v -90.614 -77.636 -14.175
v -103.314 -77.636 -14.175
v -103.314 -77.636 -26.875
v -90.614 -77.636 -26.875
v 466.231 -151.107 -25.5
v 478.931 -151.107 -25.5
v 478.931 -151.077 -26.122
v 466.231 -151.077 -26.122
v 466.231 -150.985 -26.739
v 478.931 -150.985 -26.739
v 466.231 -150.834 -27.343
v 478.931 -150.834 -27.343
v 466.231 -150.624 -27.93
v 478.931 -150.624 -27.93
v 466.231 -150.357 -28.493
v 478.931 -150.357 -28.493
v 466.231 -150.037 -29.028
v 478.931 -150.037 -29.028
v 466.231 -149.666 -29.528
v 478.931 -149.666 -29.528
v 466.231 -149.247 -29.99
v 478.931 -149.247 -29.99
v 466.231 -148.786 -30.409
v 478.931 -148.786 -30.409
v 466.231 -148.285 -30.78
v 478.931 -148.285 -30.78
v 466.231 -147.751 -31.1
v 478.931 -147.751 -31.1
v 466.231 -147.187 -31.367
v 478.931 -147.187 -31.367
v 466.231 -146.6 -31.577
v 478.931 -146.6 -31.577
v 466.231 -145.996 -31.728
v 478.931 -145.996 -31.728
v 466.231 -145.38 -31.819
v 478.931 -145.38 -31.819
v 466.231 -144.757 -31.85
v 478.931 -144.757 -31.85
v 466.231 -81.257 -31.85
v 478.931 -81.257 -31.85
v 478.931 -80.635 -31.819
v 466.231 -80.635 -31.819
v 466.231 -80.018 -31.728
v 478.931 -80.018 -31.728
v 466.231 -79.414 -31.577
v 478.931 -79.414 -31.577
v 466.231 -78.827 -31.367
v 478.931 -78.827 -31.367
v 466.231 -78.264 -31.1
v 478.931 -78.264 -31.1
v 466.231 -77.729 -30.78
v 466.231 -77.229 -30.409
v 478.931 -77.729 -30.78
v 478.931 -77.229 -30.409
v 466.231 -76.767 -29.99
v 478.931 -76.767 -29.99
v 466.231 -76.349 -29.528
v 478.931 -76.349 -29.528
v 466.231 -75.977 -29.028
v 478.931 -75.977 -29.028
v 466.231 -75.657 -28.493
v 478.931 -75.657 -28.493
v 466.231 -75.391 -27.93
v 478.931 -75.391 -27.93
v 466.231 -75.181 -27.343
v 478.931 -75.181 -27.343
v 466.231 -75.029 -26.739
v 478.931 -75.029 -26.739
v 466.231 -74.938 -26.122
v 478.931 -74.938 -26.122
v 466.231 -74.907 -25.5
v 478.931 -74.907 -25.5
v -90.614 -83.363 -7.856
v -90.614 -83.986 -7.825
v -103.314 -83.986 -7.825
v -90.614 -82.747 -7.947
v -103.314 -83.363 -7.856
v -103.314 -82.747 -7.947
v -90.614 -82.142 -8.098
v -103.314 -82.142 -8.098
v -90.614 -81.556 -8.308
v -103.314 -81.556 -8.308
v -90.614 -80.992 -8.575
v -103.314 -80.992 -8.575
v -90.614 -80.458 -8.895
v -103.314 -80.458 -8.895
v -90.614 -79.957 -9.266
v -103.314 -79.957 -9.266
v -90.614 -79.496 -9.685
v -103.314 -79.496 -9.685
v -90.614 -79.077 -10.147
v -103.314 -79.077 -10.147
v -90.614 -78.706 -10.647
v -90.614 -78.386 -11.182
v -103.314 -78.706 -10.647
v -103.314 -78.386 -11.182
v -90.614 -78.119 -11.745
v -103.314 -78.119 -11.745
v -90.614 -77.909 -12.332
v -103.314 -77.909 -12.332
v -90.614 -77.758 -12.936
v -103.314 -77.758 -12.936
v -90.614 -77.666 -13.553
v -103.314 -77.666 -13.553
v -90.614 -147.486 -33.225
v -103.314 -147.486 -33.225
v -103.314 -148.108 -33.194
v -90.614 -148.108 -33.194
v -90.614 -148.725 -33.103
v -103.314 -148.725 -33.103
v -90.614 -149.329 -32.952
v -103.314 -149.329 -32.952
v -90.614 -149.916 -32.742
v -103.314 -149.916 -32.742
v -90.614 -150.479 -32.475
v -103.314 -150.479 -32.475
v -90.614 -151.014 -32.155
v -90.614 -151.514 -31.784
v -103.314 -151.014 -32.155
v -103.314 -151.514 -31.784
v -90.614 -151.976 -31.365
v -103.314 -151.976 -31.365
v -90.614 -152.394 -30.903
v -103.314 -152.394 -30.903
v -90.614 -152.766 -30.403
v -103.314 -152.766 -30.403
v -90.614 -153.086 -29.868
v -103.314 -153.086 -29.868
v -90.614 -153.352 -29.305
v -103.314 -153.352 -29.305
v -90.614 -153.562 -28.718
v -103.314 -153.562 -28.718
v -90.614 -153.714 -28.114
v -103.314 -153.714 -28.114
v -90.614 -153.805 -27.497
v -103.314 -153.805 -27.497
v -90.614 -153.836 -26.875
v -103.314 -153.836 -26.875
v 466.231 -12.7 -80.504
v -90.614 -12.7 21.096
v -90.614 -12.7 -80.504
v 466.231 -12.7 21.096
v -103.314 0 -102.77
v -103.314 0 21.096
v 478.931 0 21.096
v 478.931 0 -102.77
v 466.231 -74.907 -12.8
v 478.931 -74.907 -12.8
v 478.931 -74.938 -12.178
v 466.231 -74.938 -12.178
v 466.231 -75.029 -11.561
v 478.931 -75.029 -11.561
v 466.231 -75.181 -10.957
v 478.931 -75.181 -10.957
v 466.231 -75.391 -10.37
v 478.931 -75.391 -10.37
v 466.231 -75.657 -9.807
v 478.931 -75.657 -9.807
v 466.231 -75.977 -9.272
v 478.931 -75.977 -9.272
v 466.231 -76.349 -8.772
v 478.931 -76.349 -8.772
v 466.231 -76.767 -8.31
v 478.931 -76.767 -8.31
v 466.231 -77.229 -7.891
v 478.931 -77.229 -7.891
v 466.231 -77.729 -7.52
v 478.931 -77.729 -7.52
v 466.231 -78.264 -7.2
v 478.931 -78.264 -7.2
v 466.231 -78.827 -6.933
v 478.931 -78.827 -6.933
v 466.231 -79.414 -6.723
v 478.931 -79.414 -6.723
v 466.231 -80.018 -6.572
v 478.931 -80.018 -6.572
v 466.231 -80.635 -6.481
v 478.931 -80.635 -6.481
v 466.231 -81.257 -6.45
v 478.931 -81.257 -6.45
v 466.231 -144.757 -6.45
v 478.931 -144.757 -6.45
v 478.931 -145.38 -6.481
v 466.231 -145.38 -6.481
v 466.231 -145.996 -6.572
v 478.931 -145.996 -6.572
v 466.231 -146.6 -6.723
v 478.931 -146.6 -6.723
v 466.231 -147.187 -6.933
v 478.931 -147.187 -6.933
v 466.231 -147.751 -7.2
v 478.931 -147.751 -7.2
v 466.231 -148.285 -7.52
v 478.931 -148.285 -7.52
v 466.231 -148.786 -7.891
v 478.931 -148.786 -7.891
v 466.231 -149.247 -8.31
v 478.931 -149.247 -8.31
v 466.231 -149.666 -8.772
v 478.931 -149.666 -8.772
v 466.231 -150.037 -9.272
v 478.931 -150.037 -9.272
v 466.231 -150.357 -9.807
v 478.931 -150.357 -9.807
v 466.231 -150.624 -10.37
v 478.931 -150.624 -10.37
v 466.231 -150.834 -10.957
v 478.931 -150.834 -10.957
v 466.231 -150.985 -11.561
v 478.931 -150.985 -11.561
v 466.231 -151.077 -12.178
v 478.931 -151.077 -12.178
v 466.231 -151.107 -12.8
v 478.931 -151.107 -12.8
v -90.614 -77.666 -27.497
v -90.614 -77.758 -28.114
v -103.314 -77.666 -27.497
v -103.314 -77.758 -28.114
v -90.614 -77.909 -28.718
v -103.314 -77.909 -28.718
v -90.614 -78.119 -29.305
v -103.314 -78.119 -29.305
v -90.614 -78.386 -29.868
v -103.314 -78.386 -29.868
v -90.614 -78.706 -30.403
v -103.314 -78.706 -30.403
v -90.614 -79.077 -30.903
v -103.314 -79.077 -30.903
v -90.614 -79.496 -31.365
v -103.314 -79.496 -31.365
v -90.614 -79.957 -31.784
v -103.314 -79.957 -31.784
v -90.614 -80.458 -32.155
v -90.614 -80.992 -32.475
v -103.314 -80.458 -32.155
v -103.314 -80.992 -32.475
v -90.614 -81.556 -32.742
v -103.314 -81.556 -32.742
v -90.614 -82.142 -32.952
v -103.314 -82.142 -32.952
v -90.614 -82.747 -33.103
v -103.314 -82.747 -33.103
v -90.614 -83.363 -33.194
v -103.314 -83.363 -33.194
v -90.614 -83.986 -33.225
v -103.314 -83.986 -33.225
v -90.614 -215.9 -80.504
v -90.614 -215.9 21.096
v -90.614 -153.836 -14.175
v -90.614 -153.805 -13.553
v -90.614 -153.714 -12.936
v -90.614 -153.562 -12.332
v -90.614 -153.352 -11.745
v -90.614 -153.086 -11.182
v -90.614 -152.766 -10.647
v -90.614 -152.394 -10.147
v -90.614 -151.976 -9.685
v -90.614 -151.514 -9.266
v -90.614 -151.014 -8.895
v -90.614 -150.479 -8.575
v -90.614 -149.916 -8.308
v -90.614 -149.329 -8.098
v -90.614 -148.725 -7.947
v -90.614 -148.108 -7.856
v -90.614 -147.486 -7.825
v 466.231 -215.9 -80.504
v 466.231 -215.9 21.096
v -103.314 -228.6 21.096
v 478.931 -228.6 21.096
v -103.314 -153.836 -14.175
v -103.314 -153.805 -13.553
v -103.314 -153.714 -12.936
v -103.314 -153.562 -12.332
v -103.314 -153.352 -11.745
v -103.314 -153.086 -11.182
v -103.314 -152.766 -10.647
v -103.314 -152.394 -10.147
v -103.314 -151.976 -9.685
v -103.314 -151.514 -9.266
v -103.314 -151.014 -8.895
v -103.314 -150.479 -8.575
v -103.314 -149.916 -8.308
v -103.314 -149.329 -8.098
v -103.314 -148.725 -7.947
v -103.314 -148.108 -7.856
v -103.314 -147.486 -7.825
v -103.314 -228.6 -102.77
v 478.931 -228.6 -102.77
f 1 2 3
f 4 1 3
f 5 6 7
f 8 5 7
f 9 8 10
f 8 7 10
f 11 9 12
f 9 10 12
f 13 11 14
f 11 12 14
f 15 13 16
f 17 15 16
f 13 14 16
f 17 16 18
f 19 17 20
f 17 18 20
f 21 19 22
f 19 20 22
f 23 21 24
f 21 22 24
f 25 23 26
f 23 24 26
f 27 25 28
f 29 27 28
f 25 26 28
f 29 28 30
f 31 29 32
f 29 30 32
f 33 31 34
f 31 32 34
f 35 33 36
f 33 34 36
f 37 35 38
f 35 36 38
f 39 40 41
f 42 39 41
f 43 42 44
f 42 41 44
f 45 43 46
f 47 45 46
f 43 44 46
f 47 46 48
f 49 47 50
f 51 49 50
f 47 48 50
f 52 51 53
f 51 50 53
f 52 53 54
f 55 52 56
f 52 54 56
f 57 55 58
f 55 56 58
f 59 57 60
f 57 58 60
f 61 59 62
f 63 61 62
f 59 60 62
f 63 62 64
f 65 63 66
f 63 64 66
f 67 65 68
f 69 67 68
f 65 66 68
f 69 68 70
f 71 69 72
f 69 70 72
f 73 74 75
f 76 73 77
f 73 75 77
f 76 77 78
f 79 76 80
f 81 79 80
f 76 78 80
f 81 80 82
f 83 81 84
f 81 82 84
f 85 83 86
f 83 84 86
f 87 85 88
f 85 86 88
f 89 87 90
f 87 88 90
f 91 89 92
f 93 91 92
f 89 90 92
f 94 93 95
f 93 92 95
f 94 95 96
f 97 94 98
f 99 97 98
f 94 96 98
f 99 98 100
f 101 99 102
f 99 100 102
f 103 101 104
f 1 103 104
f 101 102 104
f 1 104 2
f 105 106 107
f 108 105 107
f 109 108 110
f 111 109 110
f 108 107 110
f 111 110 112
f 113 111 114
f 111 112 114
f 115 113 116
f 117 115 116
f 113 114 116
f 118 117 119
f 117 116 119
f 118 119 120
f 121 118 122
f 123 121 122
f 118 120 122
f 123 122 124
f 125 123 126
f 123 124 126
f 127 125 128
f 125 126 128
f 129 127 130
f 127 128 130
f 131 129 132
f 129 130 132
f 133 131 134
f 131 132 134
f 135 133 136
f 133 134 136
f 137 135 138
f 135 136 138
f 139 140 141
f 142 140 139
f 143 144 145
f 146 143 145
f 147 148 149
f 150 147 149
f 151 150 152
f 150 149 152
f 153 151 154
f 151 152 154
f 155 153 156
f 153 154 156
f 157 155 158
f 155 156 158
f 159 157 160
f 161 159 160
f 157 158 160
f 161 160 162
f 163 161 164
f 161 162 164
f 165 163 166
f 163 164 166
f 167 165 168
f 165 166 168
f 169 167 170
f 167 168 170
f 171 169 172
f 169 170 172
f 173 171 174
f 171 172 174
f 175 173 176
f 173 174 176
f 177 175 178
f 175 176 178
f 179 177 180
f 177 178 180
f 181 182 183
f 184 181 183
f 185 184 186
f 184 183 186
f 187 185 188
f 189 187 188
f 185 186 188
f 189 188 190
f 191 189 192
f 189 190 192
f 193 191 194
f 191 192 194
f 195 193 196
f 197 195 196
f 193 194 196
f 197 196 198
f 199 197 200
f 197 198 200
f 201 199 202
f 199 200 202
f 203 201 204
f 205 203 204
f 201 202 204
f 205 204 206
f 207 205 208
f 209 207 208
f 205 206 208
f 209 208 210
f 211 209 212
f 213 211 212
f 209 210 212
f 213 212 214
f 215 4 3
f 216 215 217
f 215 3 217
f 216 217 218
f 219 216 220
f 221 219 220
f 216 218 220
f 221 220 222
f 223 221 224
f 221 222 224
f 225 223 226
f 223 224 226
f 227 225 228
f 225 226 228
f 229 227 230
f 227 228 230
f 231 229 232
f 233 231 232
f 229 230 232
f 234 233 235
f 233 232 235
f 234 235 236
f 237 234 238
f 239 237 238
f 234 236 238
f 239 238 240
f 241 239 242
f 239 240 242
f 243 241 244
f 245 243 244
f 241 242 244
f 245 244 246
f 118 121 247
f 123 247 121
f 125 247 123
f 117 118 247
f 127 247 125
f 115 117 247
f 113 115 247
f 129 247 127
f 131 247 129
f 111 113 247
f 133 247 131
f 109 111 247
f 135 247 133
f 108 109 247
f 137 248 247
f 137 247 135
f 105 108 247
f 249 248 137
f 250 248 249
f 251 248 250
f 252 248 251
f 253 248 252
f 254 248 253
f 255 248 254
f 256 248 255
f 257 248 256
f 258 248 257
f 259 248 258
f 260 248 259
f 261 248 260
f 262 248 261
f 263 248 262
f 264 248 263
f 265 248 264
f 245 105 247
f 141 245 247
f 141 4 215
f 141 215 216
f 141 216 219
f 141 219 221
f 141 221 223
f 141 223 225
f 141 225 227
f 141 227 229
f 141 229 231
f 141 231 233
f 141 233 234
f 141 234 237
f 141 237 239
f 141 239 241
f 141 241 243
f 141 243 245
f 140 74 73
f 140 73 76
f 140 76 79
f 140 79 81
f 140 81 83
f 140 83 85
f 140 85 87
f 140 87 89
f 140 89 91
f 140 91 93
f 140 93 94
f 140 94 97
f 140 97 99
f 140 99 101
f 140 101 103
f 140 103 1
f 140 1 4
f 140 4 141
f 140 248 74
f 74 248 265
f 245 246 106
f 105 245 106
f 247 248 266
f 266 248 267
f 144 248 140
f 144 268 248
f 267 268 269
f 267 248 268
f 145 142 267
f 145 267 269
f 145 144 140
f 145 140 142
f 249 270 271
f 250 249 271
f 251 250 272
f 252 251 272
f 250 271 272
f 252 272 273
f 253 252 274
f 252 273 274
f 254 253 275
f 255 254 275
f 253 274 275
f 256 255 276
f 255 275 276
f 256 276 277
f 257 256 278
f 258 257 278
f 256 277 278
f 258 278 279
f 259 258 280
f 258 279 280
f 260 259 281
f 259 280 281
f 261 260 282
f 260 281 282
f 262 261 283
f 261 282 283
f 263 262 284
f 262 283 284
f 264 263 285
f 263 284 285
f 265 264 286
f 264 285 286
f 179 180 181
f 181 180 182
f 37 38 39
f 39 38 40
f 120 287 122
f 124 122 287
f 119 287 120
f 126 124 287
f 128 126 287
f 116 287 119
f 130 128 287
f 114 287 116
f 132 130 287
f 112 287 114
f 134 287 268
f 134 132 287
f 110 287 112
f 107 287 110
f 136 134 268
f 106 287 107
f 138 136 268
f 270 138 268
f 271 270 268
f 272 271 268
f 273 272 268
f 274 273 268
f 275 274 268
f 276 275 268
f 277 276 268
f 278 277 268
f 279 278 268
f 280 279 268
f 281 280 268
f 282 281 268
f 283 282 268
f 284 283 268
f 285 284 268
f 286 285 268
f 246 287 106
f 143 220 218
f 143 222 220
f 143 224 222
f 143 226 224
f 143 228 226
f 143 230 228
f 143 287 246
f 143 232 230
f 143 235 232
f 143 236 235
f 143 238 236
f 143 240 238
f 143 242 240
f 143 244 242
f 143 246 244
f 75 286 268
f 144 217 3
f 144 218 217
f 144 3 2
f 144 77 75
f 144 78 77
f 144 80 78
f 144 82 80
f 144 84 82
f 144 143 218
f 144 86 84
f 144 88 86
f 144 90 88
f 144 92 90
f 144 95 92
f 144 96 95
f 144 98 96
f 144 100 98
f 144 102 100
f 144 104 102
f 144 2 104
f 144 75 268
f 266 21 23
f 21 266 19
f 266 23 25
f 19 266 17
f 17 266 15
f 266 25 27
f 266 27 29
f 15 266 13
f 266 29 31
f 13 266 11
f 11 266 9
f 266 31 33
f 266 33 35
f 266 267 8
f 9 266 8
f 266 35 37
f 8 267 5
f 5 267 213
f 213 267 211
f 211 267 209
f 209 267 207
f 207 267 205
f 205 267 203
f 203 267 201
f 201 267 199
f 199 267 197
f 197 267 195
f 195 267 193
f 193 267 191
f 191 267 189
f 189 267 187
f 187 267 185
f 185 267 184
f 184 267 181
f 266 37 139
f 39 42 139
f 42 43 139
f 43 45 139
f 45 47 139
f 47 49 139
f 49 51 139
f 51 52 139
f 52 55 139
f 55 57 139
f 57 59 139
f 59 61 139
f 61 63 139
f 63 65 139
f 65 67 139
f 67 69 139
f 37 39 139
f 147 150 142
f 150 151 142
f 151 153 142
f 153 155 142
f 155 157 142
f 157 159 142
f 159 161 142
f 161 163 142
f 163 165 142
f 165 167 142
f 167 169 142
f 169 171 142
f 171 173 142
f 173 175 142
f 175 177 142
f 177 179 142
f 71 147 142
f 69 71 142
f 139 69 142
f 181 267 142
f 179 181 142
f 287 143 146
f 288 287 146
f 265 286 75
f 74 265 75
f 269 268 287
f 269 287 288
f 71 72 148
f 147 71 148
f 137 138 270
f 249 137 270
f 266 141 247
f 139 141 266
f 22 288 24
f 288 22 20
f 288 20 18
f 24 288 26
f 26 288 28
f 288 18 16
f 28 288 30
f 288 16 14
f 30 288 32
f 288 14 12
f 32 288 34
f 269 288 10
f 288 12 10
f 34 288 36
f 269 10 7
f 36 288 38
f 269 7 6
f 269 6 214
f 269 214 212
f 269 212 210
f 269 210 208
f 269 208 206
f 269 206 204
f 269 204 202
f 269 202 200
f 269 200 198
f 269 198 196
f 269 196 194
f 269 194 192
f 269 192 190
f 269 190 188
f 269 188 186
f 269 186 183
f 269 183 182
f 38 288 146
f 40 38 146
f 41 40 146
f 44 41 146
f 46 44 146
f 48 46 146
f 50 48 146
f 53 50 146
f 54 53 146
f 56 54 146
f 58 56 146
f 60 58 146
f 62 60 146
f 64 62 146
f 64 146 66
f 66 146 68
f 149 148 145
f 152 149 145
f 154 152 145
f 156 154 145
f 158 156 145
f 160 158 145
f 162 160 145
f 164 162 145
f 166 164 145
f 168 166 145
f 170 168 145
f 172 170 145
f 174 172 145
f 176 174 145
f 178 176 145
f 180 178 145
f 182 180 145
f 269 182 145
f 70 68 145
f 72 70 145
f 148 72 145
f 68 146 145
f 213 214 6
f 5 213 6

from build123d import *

# Parameters (mm, degrees)
F0_W     = 582.2449624538
F0_H     = 123.8665860146
F1_DEPTH = 228.6
F2_W     = 556.8449624538
F2_H     = 203.2
F3_DEPTH = 101.6
F5_DEPTH = 25.4
F7_DEPTH = 25.4


with BuildPart() as f1:
    # F0 (on Front) → F1 (new body)
    with BuildSketch(Plane.XZ):
        with Locations((187.8082603216, -40.8369610086)):
            Rectangle(F0_W, F0_H)
    extrude(amount=F1_DEPTH)

    # F2 (on face) → F3 (cut)
    with BuildSketch(Plane.XY.offset(21.0963319987)):
        with Locations((187.8082603216, -114.3)):
            Rectangle(F2_W, F2_H)
    extrude(amount=-F3_DEPTH, mode=Mode.SUBTRACT)

    # F4 (on face) → F5 (cut)
    with BuildSketch(Plane.YZ.offset(478.9307415485)):
        with BuildLine():
            Line((-81.2571771383, -6.449976629), (-144.7571771383, -6.449976629))
            ThreePointArc((-144.7571771383, -6.449976629), (-149.2473051989, -8.3098485685), (-151.1071771383, -12.799976629))
            Line((-151.1071771383, -12.799976629), (-151.1071771383, -25.499976629))
            ThreePointArc((-151.1071771383, -25.499976629), (-149.2473051989, -29.9901046896), (-144.7571771383, -31.849976629))
            Line((-144.7571771383, -31.849976629), (-81.2571771383, -31.849976629))
            ThreePointArc((-81.2571771383, -31.849976629), (-76.7670490778, -29.9901046896), (-74.9071771383, -25.499976629))
            Line((-74.9071771383, -25.499976629), (-74.9071771383, -12.799976629))
            ThreePointArc((-74.9071771383, -12.799976629), (-76.7670490778, -8.3098485685), (-81.2571771383, -6.449976629))
        make_face()
    extrude(amount=-F5_DEPTH, mode=Mode.SUBTRACT)

    # F6 (on face) → F7 (cut)
    with BuildSketch(Plane(origin=(-103.3142209053, 0, 0), x_dir=(0, -1, 0), z_dir=(-1, 0, 0))):
        with BuildLine():
            Line((147.485794878, -7.8250148058), (83.985794878, -7.8250148058))
            ThreePointArc((83.985794878, -7.8250148058), (79.4956668175, -9.6848867453), (77.635794878, -14.1750148058))
            Line((77.635794878, -14.1750148058), (77.635794878, -26.8750148058))
            ThreePointArc((77.635794878, -26.8750148058), (79.4956668175, -31.3651428663), (83.985794878, -33.2250148058))
            Line((83.985794878, -33.2250148058), (147.485794878, -33.2250148058))
            ThreePointArc((147.485794878, -33.2250148058), (151.9759229385, -31.3651428663), (153.835794878, -26.8750148058))
            Line((153.835794878, -26.8750148058), (153.835794878, -14.1750148058))
            ThreePointArc((153.835794878, -14.1750148058), (151.9759229385, -9.6848867453), (147.485794878, -7.8250148058))
        make_face()
    extrude(amount=-F7_DEPTH, mode=Mode.SUBTRACT)


solid = f1.part
